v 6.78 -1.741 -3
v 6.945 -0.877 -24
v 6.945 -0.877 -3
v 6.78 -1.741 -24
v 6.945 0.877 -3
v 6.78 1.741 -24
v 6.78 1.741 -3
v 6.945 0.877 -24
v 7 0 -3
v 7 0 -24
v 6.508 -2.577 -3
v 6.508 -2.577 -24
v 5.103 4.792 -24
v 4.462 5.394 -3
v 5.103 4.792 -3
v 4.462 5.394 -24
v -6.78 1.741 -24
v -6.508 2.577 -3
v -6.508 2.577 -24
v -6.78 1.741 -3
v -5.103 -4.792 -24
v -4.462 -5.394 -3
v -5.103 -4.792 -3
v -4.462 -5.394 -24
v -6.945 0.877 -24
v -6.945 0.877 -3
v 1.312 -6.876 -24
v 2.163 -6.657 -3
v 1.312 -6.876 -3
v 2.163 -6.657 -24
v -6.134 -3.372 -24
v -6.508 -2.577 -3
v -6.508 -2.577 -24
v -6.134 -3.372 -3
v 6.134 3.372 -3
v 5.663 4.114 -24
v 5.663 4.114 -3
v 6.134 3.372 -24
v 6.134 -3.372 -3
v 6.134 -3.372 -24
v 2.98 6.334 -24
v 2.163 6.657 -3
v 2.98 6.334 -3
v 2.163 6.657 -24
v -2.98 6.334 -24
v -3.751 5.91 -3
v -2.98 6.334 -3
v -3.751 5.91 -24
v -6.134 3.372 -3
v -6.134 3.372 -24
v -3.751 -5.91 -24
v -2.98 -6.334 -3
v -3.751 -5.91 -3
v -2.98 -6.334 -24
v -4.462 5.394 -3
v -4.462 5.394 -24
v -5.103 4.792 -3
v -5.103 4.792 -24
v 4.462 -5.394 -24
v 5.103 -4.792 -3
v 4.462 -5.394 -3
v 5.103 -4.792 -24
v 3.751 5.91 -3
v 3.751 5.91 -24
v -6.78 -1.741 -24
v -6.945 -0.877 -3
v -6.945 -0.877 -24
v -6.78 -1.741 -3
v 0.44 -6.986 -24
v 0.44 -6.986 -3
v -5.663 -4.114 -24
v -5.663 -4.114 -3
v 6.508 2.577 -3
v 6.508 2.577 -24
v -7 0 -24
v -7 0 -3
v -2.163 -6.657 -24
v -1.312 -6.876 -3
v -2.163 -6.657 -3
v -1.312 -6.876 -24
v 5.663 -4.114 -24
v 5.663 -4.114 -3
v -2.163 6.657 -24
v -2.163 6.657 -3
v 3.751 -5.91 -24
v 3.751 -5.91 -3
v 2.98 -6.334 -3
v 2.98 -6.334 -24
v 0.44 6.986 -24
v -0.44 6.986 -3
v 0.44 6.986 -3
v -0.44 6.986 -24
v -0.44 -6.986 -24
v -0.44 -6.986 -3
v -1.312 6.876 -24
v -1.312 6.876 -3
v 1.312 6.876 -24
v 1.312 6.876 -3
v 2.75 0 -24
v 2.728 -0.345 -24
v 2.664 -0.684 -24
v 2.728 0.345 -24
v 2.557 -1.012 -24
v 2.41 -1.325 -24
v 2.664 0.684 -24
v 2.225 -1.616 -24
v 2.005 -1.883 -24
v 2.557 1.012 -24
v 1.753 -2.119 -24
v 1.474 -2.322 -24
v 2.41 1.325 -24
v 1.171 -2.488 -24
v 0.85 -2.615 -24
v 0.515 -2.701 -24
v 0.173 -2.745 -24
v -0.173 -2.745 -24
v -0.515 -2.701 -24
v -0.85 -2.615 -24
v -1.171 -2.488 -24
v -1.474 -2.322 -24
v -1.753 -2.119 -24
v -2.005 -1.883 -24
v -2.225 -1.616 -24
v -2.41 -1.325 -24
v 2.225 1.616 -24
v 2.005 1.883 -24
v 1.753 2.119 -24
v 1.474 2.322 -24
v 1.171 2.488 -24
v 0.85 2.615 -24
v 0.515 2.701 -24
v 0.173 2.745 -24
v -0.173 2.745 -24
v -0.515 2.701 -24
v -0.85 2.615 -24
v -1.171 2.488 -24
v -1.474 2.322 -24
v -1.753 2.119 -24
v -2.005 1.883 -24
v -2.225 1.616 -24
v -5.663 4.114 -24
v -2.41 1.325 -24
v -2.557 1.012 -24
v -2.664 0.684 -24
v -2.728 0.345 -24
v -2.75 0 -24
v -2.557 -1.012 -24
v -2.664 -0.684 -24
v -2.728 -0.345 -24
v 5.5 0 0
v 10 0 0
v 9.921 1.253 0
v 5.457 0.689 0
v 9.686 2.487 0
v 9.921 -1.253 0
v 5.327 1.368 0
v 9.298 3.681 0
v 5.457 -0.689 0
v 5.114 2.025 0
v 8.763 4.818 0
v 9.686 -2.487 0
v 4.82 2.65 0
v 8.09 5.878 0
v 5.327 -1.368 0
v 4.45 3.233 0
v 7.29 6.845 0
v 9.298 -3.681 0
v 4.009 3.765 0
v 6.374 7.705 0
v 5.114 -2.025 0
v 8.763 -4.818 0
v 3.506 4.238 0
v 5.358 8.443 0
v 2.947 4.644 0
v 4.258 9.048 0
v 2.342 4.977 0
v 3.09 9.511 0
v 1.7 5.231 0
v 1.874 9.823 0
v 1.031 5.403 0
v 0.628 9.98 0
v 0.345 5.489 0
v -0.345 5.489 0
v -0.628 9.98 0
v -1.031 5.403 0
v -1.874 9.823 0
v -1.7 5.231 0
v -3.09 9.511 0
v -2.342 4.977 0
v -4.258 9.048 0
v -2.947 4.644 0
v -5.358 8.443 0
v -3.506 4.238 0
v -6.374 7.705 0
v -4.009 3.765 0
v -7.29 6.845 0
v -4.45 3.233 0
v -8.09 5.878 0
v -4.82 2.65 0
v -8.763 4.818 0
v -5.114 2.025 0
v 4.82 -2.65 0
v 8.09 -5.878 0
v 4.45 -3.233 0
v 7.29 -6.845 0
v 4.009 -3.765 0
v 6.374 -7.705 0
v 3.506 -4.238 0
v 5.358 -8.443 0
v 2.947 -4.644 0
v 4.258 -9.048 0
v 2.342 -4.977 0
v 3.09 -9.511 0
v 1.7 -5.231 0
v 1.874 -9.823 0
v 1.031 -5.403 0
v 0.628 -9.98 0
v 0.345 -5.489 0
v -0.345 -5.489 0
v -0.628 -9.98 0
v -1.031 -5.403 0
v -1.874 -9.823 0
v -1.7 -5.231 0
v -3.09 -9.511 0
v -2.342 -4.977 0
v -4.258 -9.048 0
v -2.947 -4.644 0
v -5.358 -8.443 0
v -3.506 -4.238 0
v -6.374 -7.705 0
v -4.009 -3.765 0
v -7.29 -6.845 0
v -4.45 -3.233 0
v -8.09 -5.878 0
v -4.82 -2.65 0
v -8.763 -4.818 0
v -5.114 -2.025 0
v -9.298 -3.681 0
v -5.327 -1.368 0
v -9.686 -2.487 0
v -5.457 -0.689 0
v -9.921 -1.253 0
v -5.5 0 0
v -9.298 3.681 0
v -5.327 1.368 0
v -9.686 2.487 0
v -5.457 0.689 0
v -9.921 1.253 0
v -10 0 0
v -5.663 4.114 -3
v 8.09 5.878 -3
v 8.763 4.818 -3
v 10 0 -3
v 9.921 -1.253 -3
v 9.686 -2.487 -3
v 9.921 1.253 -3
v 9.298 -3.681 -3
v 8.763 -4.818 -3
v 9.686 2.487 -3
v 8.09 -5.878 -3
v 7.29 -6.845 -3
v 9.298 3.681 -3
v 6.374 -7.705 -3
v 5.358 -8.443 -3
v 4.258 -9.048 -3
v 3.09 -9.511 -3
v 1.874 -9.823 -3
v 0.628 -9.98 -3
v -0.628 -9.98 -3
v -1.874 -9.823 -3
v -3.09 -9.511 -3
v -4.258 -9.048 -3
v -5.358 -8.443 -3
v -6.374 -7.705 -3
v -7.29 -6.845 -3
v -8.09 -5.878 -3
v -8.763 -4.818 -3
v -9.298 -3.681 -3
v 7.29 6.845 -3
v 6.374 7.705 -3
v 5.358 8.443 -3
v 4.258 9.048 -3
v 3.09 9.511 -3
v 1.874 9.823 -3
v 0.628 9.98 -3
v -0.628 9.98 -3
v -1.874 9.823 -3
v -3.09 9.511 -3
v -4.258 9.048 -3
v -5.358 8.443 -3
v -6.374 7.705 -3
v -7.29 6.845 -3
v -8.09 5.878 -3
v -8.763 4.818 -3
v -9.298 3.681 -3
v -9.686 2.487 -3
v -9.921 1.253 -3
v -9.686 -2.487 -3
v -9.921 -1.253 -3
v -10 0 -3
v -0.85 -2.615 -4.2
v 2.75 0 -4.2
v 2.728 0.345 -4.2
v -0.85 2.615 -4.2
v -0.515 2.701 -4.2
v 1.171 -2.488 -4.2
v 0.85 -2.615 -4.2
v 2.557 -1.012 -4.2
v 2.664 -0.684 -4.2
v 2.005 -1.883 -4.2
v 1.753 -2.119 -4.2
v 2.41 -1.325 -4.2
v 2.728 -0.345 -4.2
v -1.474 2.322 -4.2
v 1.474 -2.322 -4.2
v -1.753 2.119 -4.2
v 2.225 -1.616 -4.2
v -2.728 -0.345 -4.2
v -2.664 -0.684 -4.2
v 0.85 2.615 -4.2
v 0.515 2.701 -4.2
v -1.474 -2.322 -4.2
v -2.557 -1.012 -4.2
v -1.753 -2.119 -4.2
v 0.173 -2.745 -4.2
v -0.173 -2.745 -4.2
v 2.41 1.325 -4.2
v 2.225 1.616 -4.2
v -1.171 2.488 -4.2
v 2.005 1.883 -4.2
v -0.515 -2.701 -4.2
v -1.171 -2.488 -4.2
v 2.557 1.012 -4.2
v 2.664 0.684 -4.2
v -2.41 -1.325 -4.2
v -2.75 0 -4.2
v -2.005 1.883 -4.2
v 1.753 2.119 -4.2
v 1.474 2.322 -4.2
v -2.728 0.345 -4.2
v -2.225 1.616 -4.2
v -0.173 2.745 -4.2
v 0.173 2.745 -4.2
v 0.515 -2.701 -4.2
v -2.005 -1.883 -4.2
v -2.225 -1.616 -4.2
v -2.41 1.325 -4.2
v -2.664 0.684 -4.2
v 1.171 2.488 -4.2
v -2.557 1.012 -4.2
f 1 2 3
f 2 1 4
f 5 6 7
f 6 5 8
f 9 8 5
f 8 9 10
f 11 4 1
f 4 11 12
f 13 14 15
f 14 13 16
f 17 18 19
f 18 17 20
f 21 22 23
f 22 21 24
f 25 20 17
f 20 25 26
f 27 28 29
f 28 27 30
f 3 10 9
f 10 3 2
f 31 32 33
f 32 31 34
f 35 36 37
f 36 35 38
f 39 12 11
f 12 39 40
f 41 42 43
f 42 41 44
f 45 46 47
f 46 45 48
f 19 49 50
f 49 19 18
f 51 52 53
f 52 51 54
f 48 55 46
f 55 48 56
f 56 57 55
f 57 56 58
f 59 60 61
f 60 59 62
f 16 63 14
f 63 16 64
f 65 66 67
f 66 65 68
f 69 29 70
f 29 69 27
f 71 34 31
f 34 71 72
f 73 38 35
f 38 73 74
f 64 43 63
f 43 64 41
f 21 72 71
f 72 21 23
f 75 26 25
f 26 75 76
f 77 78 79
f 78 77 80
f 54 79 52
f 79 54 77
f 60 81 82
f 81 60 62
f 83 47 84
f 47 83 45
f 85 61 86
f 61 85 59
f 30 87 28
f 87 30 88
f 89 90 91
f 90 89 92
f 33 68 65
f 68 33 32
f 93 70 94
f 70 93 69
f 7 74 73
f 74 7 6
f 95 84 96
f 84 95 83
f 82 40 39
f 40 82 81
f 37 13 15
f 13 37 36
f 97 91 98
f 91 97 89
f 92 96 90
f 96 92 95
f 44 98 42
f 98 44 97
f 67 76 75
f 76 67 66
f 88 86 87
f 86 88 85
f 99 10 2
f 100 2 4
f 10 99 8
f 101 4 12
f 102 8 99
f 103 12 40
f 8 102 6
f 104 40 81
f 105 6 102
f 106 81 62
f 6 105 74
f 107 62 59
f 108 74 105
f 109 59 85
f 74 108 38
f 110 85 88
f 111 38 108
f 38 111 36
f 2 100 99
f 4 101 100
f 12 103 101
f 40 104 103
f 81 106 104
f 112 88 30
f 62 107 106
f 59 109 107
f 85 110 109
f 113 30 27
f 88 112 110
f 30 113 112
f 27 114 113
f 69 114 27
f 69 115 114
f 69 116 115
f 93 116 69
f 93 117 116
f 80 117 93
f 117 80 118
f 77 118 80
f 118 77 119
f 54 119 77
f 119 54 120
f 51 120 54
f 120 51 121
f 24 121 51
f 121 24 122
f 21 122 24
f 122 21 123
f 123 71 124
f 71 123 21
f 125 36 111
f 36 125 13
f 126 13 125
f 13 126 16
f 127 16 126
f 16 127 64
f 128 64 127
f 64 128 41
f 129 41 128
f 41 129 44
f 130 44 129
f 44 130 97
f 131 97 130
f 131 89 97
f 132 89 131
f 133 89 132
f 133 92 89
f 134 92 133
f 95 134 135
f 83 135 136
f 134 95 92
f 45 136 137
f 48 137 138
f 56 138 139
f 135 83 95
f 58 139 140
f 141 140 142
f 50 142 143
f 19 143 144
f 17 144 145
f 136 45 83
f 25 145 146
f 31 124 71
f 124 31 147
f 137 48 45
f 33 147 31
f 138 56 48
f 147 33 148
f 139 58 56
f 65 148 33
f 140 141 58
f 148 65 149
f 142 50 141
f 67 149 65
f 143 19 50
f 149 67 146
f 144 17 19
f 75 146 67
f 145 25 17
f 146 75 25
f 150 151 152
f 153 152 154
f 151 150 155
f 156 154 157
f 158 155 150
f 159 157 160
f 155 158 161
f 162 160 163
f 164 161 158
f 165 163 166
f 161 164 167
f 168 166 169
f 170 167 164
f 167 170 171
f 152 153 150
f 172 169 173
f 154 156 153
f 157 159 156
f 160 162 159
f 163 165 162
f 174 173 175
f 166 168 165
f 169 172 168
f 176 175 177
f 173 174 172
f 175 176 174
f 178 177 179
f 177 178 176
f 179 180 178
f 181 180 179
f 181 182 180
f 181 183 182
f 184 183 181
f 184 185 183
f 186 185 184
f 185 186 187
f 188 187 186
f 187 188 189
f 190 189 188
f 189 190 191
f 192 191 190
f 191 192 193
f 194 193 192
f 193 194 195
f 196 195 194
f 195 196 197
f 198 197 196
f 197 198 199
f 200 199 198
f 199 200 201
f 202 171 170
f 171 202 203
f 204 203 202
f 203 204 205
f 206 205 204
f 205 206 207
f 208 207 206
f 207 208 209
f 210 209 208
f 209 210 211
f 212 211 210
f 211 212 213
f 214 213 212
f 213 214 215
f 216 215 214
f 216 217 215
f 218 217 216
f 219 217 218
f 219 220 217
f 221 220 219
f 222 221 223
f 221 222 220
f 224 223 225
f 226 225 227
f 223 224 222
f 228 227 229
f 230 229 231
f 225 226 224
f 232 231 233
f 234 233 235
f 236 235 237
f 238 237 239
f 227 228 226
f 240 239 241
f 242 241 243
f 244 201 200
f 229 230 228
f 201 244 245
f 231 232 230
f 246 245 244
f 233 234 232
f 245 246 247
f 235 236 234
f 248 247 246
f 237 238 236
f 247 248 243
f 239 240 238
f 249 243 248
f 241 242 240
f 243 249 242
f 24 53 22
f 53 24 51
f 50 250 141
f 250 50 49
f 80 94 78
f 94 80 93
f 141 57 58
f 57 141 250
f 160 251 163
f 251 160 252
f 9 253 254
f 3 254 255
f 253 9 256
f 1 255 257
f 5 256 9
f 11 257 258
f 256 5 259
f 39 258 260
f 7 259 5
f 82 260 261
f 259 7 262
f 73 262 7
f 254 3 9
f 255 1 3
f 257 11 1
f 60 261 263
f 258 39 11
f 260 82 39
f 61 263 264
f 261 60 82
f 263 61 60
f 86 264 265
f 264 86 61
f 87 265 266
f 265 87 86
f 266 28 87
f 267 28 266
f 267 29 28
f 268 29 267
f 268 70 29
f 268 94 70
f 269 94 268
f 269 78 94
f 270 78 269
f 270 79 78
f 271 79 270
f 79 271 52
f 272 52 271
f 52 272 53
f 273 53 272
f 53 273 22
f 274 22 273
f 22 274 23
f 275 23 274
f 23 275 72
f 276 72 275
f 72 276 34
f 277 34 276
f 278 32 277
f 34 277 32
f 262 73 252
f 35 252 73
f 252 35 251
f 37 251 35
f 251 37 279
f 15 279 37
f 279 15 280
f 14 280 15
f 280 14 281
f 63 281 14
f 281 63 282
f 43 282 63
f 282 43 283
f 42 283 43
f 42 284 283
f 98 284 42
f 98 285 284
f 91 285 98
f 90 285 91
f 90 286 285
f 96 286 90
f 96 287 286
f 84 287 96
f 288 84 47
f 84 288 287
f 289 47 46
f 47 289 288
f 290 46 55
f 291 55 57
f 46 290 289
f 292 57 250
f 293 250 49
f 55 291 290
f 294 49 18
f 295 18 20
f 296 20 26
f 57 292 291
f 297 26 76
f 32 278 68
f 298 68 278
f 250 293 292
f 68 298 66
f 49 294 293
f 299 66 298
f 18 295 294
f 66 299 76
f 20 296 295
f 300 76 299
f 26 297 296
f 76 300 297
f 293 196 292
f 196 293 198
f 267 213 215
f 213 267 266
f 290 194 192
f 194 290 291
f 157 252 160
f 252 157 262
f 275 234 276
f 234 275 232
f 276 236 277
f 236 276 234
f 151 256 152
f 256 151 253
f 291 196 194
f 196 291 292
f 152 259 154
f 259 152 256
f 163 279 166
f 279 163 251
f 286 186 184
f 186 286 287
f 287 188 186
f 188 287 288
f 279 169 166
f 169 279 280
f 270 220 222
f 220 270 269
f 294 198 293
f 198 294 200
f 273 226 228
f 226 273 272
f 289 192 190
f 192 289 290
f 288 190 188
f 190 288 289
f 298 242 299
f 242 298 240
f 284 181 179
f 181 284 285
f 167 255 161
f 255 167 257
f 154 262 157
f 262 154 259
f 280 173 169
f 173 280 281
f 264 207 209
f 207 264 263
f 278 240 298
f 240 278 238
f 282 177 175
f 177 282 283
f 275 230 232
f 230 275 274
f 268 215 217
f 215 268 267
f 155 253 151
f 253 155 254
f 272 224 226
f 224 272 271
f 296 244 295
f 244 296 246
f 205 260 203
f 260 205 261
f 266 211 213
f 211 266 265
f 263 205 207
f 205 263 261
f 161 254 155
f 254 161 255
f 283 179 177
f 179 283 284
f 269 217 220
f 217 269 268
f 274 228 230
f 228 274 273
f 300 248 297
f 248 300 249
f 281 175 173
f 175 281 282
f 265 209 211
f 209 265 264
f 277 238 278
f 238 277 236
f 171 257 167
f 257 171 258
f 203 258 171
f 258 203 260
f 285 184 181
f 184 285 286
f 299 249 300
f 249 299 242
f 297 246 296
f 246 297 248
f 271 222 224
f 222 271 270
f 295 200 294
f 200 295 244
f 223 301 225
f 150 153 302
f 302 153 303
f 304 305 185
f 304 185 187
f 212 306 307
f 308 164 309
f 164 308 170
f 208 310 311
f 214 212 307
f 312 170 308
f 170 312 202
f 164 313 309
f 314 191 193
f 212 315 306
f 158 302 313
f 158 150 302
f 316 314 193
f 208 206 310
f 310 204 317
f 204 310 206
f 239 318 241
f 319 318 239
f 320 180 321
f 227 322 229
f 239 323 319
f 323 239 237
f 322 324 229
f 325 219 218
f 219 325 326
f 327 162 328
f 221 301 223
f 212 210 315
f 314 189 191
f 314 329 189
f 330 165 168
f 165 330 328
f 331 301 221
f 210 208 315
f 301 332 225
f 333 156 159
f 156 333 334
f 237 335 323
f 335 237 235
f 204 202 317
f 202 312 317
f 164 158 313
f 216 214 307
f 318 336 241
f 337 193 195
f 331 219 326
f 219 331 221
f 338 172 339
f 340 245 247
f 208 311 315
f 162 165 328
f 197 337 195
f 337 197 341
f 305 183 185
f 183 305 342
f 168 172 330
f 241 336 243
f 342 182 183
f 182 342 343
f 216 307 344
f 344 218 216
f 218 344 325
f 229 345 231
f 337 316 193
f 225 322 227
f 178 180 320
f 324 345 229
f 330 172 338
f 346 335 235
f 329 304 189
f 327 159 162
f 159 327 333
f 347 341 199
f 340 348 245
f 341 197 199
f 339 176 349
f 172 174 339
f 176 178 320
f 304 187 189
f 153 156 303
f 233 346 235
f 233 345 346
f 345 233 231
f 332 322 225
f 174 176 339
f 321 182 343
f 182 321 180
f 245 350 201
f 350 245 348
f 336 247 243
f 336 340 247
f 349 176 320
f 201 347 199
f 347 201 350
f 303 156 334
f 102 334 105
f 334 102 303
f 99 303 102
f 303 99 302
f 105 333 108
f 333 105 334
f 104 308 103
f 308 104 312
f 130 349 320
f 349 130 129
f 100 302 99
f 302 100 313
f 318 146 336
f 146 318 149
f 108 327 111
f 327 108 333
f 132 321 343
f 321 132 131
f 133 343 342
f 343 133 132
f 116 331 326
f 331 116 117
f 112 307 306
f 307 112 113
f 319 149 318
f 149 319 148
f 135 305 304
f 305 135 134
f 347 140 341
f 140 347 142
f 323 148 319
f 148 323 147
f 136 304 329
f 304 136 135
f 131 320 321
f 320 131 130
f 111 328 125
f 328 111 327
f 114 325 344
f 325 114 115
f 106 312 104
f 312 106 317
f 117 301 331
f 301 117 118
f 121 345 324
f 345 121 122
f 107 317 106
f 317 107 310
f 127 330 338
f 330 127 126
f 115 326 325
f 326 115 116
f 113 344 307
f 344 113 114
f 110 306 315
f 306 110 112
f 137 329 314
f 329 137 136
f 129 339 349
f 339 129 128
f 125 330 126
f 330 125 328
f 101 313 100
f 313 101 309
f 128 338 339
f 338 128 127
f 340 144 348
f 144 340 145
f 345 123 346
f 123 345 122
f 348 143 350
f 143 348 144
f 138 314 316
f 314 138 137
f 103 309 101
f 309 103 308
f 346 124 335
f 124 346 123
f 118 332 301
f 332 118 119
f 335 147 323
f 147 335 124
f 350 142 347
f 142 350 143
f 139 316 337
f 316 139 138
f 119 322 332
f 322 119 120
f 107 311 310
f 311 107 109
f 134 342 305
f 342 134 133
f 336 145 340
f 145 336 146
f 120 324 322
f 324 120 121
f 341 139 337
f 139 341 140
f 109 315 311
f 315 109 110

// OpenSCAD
$fn = 50;


difference() {
	union() {
		translate(v = [0, 0, -24.0000000000]) {
			cylinder(h = 24, r = 7.0000000000);
		}
		translate(v = [0, 0, -3.0000000000]) {
			cylinder(h = 3, r = 10.0000000000);
		}
	}
	union() {
		translate(v = [0, 0, 0]) {
			rotate(a = [0, 0, 0]) {
				difference() {
					union() {
						#translate(v = [0, 0, -24.0000000000]) {
							cylinder(h = 24, r = 2.2500000000);
						}
						#translate(v = [0, 0, -4.2000000000]) {
							cylinder(h = 4.2000000000, r = 7.0000000000, r1 = 2.7500000000, r2 = 5.5000000000);
						}
						#translate(v = [0, 0, -24.0000000000]) {
							cylinder(h = 24, r = 2.7500000000);
						}
						#translate(v = [0, 0, -24.0000000000]) {
							cylinder(h = 24, r = 2.2500000000);
						}
					}
					union();
				}
			}
		}
	}
}
